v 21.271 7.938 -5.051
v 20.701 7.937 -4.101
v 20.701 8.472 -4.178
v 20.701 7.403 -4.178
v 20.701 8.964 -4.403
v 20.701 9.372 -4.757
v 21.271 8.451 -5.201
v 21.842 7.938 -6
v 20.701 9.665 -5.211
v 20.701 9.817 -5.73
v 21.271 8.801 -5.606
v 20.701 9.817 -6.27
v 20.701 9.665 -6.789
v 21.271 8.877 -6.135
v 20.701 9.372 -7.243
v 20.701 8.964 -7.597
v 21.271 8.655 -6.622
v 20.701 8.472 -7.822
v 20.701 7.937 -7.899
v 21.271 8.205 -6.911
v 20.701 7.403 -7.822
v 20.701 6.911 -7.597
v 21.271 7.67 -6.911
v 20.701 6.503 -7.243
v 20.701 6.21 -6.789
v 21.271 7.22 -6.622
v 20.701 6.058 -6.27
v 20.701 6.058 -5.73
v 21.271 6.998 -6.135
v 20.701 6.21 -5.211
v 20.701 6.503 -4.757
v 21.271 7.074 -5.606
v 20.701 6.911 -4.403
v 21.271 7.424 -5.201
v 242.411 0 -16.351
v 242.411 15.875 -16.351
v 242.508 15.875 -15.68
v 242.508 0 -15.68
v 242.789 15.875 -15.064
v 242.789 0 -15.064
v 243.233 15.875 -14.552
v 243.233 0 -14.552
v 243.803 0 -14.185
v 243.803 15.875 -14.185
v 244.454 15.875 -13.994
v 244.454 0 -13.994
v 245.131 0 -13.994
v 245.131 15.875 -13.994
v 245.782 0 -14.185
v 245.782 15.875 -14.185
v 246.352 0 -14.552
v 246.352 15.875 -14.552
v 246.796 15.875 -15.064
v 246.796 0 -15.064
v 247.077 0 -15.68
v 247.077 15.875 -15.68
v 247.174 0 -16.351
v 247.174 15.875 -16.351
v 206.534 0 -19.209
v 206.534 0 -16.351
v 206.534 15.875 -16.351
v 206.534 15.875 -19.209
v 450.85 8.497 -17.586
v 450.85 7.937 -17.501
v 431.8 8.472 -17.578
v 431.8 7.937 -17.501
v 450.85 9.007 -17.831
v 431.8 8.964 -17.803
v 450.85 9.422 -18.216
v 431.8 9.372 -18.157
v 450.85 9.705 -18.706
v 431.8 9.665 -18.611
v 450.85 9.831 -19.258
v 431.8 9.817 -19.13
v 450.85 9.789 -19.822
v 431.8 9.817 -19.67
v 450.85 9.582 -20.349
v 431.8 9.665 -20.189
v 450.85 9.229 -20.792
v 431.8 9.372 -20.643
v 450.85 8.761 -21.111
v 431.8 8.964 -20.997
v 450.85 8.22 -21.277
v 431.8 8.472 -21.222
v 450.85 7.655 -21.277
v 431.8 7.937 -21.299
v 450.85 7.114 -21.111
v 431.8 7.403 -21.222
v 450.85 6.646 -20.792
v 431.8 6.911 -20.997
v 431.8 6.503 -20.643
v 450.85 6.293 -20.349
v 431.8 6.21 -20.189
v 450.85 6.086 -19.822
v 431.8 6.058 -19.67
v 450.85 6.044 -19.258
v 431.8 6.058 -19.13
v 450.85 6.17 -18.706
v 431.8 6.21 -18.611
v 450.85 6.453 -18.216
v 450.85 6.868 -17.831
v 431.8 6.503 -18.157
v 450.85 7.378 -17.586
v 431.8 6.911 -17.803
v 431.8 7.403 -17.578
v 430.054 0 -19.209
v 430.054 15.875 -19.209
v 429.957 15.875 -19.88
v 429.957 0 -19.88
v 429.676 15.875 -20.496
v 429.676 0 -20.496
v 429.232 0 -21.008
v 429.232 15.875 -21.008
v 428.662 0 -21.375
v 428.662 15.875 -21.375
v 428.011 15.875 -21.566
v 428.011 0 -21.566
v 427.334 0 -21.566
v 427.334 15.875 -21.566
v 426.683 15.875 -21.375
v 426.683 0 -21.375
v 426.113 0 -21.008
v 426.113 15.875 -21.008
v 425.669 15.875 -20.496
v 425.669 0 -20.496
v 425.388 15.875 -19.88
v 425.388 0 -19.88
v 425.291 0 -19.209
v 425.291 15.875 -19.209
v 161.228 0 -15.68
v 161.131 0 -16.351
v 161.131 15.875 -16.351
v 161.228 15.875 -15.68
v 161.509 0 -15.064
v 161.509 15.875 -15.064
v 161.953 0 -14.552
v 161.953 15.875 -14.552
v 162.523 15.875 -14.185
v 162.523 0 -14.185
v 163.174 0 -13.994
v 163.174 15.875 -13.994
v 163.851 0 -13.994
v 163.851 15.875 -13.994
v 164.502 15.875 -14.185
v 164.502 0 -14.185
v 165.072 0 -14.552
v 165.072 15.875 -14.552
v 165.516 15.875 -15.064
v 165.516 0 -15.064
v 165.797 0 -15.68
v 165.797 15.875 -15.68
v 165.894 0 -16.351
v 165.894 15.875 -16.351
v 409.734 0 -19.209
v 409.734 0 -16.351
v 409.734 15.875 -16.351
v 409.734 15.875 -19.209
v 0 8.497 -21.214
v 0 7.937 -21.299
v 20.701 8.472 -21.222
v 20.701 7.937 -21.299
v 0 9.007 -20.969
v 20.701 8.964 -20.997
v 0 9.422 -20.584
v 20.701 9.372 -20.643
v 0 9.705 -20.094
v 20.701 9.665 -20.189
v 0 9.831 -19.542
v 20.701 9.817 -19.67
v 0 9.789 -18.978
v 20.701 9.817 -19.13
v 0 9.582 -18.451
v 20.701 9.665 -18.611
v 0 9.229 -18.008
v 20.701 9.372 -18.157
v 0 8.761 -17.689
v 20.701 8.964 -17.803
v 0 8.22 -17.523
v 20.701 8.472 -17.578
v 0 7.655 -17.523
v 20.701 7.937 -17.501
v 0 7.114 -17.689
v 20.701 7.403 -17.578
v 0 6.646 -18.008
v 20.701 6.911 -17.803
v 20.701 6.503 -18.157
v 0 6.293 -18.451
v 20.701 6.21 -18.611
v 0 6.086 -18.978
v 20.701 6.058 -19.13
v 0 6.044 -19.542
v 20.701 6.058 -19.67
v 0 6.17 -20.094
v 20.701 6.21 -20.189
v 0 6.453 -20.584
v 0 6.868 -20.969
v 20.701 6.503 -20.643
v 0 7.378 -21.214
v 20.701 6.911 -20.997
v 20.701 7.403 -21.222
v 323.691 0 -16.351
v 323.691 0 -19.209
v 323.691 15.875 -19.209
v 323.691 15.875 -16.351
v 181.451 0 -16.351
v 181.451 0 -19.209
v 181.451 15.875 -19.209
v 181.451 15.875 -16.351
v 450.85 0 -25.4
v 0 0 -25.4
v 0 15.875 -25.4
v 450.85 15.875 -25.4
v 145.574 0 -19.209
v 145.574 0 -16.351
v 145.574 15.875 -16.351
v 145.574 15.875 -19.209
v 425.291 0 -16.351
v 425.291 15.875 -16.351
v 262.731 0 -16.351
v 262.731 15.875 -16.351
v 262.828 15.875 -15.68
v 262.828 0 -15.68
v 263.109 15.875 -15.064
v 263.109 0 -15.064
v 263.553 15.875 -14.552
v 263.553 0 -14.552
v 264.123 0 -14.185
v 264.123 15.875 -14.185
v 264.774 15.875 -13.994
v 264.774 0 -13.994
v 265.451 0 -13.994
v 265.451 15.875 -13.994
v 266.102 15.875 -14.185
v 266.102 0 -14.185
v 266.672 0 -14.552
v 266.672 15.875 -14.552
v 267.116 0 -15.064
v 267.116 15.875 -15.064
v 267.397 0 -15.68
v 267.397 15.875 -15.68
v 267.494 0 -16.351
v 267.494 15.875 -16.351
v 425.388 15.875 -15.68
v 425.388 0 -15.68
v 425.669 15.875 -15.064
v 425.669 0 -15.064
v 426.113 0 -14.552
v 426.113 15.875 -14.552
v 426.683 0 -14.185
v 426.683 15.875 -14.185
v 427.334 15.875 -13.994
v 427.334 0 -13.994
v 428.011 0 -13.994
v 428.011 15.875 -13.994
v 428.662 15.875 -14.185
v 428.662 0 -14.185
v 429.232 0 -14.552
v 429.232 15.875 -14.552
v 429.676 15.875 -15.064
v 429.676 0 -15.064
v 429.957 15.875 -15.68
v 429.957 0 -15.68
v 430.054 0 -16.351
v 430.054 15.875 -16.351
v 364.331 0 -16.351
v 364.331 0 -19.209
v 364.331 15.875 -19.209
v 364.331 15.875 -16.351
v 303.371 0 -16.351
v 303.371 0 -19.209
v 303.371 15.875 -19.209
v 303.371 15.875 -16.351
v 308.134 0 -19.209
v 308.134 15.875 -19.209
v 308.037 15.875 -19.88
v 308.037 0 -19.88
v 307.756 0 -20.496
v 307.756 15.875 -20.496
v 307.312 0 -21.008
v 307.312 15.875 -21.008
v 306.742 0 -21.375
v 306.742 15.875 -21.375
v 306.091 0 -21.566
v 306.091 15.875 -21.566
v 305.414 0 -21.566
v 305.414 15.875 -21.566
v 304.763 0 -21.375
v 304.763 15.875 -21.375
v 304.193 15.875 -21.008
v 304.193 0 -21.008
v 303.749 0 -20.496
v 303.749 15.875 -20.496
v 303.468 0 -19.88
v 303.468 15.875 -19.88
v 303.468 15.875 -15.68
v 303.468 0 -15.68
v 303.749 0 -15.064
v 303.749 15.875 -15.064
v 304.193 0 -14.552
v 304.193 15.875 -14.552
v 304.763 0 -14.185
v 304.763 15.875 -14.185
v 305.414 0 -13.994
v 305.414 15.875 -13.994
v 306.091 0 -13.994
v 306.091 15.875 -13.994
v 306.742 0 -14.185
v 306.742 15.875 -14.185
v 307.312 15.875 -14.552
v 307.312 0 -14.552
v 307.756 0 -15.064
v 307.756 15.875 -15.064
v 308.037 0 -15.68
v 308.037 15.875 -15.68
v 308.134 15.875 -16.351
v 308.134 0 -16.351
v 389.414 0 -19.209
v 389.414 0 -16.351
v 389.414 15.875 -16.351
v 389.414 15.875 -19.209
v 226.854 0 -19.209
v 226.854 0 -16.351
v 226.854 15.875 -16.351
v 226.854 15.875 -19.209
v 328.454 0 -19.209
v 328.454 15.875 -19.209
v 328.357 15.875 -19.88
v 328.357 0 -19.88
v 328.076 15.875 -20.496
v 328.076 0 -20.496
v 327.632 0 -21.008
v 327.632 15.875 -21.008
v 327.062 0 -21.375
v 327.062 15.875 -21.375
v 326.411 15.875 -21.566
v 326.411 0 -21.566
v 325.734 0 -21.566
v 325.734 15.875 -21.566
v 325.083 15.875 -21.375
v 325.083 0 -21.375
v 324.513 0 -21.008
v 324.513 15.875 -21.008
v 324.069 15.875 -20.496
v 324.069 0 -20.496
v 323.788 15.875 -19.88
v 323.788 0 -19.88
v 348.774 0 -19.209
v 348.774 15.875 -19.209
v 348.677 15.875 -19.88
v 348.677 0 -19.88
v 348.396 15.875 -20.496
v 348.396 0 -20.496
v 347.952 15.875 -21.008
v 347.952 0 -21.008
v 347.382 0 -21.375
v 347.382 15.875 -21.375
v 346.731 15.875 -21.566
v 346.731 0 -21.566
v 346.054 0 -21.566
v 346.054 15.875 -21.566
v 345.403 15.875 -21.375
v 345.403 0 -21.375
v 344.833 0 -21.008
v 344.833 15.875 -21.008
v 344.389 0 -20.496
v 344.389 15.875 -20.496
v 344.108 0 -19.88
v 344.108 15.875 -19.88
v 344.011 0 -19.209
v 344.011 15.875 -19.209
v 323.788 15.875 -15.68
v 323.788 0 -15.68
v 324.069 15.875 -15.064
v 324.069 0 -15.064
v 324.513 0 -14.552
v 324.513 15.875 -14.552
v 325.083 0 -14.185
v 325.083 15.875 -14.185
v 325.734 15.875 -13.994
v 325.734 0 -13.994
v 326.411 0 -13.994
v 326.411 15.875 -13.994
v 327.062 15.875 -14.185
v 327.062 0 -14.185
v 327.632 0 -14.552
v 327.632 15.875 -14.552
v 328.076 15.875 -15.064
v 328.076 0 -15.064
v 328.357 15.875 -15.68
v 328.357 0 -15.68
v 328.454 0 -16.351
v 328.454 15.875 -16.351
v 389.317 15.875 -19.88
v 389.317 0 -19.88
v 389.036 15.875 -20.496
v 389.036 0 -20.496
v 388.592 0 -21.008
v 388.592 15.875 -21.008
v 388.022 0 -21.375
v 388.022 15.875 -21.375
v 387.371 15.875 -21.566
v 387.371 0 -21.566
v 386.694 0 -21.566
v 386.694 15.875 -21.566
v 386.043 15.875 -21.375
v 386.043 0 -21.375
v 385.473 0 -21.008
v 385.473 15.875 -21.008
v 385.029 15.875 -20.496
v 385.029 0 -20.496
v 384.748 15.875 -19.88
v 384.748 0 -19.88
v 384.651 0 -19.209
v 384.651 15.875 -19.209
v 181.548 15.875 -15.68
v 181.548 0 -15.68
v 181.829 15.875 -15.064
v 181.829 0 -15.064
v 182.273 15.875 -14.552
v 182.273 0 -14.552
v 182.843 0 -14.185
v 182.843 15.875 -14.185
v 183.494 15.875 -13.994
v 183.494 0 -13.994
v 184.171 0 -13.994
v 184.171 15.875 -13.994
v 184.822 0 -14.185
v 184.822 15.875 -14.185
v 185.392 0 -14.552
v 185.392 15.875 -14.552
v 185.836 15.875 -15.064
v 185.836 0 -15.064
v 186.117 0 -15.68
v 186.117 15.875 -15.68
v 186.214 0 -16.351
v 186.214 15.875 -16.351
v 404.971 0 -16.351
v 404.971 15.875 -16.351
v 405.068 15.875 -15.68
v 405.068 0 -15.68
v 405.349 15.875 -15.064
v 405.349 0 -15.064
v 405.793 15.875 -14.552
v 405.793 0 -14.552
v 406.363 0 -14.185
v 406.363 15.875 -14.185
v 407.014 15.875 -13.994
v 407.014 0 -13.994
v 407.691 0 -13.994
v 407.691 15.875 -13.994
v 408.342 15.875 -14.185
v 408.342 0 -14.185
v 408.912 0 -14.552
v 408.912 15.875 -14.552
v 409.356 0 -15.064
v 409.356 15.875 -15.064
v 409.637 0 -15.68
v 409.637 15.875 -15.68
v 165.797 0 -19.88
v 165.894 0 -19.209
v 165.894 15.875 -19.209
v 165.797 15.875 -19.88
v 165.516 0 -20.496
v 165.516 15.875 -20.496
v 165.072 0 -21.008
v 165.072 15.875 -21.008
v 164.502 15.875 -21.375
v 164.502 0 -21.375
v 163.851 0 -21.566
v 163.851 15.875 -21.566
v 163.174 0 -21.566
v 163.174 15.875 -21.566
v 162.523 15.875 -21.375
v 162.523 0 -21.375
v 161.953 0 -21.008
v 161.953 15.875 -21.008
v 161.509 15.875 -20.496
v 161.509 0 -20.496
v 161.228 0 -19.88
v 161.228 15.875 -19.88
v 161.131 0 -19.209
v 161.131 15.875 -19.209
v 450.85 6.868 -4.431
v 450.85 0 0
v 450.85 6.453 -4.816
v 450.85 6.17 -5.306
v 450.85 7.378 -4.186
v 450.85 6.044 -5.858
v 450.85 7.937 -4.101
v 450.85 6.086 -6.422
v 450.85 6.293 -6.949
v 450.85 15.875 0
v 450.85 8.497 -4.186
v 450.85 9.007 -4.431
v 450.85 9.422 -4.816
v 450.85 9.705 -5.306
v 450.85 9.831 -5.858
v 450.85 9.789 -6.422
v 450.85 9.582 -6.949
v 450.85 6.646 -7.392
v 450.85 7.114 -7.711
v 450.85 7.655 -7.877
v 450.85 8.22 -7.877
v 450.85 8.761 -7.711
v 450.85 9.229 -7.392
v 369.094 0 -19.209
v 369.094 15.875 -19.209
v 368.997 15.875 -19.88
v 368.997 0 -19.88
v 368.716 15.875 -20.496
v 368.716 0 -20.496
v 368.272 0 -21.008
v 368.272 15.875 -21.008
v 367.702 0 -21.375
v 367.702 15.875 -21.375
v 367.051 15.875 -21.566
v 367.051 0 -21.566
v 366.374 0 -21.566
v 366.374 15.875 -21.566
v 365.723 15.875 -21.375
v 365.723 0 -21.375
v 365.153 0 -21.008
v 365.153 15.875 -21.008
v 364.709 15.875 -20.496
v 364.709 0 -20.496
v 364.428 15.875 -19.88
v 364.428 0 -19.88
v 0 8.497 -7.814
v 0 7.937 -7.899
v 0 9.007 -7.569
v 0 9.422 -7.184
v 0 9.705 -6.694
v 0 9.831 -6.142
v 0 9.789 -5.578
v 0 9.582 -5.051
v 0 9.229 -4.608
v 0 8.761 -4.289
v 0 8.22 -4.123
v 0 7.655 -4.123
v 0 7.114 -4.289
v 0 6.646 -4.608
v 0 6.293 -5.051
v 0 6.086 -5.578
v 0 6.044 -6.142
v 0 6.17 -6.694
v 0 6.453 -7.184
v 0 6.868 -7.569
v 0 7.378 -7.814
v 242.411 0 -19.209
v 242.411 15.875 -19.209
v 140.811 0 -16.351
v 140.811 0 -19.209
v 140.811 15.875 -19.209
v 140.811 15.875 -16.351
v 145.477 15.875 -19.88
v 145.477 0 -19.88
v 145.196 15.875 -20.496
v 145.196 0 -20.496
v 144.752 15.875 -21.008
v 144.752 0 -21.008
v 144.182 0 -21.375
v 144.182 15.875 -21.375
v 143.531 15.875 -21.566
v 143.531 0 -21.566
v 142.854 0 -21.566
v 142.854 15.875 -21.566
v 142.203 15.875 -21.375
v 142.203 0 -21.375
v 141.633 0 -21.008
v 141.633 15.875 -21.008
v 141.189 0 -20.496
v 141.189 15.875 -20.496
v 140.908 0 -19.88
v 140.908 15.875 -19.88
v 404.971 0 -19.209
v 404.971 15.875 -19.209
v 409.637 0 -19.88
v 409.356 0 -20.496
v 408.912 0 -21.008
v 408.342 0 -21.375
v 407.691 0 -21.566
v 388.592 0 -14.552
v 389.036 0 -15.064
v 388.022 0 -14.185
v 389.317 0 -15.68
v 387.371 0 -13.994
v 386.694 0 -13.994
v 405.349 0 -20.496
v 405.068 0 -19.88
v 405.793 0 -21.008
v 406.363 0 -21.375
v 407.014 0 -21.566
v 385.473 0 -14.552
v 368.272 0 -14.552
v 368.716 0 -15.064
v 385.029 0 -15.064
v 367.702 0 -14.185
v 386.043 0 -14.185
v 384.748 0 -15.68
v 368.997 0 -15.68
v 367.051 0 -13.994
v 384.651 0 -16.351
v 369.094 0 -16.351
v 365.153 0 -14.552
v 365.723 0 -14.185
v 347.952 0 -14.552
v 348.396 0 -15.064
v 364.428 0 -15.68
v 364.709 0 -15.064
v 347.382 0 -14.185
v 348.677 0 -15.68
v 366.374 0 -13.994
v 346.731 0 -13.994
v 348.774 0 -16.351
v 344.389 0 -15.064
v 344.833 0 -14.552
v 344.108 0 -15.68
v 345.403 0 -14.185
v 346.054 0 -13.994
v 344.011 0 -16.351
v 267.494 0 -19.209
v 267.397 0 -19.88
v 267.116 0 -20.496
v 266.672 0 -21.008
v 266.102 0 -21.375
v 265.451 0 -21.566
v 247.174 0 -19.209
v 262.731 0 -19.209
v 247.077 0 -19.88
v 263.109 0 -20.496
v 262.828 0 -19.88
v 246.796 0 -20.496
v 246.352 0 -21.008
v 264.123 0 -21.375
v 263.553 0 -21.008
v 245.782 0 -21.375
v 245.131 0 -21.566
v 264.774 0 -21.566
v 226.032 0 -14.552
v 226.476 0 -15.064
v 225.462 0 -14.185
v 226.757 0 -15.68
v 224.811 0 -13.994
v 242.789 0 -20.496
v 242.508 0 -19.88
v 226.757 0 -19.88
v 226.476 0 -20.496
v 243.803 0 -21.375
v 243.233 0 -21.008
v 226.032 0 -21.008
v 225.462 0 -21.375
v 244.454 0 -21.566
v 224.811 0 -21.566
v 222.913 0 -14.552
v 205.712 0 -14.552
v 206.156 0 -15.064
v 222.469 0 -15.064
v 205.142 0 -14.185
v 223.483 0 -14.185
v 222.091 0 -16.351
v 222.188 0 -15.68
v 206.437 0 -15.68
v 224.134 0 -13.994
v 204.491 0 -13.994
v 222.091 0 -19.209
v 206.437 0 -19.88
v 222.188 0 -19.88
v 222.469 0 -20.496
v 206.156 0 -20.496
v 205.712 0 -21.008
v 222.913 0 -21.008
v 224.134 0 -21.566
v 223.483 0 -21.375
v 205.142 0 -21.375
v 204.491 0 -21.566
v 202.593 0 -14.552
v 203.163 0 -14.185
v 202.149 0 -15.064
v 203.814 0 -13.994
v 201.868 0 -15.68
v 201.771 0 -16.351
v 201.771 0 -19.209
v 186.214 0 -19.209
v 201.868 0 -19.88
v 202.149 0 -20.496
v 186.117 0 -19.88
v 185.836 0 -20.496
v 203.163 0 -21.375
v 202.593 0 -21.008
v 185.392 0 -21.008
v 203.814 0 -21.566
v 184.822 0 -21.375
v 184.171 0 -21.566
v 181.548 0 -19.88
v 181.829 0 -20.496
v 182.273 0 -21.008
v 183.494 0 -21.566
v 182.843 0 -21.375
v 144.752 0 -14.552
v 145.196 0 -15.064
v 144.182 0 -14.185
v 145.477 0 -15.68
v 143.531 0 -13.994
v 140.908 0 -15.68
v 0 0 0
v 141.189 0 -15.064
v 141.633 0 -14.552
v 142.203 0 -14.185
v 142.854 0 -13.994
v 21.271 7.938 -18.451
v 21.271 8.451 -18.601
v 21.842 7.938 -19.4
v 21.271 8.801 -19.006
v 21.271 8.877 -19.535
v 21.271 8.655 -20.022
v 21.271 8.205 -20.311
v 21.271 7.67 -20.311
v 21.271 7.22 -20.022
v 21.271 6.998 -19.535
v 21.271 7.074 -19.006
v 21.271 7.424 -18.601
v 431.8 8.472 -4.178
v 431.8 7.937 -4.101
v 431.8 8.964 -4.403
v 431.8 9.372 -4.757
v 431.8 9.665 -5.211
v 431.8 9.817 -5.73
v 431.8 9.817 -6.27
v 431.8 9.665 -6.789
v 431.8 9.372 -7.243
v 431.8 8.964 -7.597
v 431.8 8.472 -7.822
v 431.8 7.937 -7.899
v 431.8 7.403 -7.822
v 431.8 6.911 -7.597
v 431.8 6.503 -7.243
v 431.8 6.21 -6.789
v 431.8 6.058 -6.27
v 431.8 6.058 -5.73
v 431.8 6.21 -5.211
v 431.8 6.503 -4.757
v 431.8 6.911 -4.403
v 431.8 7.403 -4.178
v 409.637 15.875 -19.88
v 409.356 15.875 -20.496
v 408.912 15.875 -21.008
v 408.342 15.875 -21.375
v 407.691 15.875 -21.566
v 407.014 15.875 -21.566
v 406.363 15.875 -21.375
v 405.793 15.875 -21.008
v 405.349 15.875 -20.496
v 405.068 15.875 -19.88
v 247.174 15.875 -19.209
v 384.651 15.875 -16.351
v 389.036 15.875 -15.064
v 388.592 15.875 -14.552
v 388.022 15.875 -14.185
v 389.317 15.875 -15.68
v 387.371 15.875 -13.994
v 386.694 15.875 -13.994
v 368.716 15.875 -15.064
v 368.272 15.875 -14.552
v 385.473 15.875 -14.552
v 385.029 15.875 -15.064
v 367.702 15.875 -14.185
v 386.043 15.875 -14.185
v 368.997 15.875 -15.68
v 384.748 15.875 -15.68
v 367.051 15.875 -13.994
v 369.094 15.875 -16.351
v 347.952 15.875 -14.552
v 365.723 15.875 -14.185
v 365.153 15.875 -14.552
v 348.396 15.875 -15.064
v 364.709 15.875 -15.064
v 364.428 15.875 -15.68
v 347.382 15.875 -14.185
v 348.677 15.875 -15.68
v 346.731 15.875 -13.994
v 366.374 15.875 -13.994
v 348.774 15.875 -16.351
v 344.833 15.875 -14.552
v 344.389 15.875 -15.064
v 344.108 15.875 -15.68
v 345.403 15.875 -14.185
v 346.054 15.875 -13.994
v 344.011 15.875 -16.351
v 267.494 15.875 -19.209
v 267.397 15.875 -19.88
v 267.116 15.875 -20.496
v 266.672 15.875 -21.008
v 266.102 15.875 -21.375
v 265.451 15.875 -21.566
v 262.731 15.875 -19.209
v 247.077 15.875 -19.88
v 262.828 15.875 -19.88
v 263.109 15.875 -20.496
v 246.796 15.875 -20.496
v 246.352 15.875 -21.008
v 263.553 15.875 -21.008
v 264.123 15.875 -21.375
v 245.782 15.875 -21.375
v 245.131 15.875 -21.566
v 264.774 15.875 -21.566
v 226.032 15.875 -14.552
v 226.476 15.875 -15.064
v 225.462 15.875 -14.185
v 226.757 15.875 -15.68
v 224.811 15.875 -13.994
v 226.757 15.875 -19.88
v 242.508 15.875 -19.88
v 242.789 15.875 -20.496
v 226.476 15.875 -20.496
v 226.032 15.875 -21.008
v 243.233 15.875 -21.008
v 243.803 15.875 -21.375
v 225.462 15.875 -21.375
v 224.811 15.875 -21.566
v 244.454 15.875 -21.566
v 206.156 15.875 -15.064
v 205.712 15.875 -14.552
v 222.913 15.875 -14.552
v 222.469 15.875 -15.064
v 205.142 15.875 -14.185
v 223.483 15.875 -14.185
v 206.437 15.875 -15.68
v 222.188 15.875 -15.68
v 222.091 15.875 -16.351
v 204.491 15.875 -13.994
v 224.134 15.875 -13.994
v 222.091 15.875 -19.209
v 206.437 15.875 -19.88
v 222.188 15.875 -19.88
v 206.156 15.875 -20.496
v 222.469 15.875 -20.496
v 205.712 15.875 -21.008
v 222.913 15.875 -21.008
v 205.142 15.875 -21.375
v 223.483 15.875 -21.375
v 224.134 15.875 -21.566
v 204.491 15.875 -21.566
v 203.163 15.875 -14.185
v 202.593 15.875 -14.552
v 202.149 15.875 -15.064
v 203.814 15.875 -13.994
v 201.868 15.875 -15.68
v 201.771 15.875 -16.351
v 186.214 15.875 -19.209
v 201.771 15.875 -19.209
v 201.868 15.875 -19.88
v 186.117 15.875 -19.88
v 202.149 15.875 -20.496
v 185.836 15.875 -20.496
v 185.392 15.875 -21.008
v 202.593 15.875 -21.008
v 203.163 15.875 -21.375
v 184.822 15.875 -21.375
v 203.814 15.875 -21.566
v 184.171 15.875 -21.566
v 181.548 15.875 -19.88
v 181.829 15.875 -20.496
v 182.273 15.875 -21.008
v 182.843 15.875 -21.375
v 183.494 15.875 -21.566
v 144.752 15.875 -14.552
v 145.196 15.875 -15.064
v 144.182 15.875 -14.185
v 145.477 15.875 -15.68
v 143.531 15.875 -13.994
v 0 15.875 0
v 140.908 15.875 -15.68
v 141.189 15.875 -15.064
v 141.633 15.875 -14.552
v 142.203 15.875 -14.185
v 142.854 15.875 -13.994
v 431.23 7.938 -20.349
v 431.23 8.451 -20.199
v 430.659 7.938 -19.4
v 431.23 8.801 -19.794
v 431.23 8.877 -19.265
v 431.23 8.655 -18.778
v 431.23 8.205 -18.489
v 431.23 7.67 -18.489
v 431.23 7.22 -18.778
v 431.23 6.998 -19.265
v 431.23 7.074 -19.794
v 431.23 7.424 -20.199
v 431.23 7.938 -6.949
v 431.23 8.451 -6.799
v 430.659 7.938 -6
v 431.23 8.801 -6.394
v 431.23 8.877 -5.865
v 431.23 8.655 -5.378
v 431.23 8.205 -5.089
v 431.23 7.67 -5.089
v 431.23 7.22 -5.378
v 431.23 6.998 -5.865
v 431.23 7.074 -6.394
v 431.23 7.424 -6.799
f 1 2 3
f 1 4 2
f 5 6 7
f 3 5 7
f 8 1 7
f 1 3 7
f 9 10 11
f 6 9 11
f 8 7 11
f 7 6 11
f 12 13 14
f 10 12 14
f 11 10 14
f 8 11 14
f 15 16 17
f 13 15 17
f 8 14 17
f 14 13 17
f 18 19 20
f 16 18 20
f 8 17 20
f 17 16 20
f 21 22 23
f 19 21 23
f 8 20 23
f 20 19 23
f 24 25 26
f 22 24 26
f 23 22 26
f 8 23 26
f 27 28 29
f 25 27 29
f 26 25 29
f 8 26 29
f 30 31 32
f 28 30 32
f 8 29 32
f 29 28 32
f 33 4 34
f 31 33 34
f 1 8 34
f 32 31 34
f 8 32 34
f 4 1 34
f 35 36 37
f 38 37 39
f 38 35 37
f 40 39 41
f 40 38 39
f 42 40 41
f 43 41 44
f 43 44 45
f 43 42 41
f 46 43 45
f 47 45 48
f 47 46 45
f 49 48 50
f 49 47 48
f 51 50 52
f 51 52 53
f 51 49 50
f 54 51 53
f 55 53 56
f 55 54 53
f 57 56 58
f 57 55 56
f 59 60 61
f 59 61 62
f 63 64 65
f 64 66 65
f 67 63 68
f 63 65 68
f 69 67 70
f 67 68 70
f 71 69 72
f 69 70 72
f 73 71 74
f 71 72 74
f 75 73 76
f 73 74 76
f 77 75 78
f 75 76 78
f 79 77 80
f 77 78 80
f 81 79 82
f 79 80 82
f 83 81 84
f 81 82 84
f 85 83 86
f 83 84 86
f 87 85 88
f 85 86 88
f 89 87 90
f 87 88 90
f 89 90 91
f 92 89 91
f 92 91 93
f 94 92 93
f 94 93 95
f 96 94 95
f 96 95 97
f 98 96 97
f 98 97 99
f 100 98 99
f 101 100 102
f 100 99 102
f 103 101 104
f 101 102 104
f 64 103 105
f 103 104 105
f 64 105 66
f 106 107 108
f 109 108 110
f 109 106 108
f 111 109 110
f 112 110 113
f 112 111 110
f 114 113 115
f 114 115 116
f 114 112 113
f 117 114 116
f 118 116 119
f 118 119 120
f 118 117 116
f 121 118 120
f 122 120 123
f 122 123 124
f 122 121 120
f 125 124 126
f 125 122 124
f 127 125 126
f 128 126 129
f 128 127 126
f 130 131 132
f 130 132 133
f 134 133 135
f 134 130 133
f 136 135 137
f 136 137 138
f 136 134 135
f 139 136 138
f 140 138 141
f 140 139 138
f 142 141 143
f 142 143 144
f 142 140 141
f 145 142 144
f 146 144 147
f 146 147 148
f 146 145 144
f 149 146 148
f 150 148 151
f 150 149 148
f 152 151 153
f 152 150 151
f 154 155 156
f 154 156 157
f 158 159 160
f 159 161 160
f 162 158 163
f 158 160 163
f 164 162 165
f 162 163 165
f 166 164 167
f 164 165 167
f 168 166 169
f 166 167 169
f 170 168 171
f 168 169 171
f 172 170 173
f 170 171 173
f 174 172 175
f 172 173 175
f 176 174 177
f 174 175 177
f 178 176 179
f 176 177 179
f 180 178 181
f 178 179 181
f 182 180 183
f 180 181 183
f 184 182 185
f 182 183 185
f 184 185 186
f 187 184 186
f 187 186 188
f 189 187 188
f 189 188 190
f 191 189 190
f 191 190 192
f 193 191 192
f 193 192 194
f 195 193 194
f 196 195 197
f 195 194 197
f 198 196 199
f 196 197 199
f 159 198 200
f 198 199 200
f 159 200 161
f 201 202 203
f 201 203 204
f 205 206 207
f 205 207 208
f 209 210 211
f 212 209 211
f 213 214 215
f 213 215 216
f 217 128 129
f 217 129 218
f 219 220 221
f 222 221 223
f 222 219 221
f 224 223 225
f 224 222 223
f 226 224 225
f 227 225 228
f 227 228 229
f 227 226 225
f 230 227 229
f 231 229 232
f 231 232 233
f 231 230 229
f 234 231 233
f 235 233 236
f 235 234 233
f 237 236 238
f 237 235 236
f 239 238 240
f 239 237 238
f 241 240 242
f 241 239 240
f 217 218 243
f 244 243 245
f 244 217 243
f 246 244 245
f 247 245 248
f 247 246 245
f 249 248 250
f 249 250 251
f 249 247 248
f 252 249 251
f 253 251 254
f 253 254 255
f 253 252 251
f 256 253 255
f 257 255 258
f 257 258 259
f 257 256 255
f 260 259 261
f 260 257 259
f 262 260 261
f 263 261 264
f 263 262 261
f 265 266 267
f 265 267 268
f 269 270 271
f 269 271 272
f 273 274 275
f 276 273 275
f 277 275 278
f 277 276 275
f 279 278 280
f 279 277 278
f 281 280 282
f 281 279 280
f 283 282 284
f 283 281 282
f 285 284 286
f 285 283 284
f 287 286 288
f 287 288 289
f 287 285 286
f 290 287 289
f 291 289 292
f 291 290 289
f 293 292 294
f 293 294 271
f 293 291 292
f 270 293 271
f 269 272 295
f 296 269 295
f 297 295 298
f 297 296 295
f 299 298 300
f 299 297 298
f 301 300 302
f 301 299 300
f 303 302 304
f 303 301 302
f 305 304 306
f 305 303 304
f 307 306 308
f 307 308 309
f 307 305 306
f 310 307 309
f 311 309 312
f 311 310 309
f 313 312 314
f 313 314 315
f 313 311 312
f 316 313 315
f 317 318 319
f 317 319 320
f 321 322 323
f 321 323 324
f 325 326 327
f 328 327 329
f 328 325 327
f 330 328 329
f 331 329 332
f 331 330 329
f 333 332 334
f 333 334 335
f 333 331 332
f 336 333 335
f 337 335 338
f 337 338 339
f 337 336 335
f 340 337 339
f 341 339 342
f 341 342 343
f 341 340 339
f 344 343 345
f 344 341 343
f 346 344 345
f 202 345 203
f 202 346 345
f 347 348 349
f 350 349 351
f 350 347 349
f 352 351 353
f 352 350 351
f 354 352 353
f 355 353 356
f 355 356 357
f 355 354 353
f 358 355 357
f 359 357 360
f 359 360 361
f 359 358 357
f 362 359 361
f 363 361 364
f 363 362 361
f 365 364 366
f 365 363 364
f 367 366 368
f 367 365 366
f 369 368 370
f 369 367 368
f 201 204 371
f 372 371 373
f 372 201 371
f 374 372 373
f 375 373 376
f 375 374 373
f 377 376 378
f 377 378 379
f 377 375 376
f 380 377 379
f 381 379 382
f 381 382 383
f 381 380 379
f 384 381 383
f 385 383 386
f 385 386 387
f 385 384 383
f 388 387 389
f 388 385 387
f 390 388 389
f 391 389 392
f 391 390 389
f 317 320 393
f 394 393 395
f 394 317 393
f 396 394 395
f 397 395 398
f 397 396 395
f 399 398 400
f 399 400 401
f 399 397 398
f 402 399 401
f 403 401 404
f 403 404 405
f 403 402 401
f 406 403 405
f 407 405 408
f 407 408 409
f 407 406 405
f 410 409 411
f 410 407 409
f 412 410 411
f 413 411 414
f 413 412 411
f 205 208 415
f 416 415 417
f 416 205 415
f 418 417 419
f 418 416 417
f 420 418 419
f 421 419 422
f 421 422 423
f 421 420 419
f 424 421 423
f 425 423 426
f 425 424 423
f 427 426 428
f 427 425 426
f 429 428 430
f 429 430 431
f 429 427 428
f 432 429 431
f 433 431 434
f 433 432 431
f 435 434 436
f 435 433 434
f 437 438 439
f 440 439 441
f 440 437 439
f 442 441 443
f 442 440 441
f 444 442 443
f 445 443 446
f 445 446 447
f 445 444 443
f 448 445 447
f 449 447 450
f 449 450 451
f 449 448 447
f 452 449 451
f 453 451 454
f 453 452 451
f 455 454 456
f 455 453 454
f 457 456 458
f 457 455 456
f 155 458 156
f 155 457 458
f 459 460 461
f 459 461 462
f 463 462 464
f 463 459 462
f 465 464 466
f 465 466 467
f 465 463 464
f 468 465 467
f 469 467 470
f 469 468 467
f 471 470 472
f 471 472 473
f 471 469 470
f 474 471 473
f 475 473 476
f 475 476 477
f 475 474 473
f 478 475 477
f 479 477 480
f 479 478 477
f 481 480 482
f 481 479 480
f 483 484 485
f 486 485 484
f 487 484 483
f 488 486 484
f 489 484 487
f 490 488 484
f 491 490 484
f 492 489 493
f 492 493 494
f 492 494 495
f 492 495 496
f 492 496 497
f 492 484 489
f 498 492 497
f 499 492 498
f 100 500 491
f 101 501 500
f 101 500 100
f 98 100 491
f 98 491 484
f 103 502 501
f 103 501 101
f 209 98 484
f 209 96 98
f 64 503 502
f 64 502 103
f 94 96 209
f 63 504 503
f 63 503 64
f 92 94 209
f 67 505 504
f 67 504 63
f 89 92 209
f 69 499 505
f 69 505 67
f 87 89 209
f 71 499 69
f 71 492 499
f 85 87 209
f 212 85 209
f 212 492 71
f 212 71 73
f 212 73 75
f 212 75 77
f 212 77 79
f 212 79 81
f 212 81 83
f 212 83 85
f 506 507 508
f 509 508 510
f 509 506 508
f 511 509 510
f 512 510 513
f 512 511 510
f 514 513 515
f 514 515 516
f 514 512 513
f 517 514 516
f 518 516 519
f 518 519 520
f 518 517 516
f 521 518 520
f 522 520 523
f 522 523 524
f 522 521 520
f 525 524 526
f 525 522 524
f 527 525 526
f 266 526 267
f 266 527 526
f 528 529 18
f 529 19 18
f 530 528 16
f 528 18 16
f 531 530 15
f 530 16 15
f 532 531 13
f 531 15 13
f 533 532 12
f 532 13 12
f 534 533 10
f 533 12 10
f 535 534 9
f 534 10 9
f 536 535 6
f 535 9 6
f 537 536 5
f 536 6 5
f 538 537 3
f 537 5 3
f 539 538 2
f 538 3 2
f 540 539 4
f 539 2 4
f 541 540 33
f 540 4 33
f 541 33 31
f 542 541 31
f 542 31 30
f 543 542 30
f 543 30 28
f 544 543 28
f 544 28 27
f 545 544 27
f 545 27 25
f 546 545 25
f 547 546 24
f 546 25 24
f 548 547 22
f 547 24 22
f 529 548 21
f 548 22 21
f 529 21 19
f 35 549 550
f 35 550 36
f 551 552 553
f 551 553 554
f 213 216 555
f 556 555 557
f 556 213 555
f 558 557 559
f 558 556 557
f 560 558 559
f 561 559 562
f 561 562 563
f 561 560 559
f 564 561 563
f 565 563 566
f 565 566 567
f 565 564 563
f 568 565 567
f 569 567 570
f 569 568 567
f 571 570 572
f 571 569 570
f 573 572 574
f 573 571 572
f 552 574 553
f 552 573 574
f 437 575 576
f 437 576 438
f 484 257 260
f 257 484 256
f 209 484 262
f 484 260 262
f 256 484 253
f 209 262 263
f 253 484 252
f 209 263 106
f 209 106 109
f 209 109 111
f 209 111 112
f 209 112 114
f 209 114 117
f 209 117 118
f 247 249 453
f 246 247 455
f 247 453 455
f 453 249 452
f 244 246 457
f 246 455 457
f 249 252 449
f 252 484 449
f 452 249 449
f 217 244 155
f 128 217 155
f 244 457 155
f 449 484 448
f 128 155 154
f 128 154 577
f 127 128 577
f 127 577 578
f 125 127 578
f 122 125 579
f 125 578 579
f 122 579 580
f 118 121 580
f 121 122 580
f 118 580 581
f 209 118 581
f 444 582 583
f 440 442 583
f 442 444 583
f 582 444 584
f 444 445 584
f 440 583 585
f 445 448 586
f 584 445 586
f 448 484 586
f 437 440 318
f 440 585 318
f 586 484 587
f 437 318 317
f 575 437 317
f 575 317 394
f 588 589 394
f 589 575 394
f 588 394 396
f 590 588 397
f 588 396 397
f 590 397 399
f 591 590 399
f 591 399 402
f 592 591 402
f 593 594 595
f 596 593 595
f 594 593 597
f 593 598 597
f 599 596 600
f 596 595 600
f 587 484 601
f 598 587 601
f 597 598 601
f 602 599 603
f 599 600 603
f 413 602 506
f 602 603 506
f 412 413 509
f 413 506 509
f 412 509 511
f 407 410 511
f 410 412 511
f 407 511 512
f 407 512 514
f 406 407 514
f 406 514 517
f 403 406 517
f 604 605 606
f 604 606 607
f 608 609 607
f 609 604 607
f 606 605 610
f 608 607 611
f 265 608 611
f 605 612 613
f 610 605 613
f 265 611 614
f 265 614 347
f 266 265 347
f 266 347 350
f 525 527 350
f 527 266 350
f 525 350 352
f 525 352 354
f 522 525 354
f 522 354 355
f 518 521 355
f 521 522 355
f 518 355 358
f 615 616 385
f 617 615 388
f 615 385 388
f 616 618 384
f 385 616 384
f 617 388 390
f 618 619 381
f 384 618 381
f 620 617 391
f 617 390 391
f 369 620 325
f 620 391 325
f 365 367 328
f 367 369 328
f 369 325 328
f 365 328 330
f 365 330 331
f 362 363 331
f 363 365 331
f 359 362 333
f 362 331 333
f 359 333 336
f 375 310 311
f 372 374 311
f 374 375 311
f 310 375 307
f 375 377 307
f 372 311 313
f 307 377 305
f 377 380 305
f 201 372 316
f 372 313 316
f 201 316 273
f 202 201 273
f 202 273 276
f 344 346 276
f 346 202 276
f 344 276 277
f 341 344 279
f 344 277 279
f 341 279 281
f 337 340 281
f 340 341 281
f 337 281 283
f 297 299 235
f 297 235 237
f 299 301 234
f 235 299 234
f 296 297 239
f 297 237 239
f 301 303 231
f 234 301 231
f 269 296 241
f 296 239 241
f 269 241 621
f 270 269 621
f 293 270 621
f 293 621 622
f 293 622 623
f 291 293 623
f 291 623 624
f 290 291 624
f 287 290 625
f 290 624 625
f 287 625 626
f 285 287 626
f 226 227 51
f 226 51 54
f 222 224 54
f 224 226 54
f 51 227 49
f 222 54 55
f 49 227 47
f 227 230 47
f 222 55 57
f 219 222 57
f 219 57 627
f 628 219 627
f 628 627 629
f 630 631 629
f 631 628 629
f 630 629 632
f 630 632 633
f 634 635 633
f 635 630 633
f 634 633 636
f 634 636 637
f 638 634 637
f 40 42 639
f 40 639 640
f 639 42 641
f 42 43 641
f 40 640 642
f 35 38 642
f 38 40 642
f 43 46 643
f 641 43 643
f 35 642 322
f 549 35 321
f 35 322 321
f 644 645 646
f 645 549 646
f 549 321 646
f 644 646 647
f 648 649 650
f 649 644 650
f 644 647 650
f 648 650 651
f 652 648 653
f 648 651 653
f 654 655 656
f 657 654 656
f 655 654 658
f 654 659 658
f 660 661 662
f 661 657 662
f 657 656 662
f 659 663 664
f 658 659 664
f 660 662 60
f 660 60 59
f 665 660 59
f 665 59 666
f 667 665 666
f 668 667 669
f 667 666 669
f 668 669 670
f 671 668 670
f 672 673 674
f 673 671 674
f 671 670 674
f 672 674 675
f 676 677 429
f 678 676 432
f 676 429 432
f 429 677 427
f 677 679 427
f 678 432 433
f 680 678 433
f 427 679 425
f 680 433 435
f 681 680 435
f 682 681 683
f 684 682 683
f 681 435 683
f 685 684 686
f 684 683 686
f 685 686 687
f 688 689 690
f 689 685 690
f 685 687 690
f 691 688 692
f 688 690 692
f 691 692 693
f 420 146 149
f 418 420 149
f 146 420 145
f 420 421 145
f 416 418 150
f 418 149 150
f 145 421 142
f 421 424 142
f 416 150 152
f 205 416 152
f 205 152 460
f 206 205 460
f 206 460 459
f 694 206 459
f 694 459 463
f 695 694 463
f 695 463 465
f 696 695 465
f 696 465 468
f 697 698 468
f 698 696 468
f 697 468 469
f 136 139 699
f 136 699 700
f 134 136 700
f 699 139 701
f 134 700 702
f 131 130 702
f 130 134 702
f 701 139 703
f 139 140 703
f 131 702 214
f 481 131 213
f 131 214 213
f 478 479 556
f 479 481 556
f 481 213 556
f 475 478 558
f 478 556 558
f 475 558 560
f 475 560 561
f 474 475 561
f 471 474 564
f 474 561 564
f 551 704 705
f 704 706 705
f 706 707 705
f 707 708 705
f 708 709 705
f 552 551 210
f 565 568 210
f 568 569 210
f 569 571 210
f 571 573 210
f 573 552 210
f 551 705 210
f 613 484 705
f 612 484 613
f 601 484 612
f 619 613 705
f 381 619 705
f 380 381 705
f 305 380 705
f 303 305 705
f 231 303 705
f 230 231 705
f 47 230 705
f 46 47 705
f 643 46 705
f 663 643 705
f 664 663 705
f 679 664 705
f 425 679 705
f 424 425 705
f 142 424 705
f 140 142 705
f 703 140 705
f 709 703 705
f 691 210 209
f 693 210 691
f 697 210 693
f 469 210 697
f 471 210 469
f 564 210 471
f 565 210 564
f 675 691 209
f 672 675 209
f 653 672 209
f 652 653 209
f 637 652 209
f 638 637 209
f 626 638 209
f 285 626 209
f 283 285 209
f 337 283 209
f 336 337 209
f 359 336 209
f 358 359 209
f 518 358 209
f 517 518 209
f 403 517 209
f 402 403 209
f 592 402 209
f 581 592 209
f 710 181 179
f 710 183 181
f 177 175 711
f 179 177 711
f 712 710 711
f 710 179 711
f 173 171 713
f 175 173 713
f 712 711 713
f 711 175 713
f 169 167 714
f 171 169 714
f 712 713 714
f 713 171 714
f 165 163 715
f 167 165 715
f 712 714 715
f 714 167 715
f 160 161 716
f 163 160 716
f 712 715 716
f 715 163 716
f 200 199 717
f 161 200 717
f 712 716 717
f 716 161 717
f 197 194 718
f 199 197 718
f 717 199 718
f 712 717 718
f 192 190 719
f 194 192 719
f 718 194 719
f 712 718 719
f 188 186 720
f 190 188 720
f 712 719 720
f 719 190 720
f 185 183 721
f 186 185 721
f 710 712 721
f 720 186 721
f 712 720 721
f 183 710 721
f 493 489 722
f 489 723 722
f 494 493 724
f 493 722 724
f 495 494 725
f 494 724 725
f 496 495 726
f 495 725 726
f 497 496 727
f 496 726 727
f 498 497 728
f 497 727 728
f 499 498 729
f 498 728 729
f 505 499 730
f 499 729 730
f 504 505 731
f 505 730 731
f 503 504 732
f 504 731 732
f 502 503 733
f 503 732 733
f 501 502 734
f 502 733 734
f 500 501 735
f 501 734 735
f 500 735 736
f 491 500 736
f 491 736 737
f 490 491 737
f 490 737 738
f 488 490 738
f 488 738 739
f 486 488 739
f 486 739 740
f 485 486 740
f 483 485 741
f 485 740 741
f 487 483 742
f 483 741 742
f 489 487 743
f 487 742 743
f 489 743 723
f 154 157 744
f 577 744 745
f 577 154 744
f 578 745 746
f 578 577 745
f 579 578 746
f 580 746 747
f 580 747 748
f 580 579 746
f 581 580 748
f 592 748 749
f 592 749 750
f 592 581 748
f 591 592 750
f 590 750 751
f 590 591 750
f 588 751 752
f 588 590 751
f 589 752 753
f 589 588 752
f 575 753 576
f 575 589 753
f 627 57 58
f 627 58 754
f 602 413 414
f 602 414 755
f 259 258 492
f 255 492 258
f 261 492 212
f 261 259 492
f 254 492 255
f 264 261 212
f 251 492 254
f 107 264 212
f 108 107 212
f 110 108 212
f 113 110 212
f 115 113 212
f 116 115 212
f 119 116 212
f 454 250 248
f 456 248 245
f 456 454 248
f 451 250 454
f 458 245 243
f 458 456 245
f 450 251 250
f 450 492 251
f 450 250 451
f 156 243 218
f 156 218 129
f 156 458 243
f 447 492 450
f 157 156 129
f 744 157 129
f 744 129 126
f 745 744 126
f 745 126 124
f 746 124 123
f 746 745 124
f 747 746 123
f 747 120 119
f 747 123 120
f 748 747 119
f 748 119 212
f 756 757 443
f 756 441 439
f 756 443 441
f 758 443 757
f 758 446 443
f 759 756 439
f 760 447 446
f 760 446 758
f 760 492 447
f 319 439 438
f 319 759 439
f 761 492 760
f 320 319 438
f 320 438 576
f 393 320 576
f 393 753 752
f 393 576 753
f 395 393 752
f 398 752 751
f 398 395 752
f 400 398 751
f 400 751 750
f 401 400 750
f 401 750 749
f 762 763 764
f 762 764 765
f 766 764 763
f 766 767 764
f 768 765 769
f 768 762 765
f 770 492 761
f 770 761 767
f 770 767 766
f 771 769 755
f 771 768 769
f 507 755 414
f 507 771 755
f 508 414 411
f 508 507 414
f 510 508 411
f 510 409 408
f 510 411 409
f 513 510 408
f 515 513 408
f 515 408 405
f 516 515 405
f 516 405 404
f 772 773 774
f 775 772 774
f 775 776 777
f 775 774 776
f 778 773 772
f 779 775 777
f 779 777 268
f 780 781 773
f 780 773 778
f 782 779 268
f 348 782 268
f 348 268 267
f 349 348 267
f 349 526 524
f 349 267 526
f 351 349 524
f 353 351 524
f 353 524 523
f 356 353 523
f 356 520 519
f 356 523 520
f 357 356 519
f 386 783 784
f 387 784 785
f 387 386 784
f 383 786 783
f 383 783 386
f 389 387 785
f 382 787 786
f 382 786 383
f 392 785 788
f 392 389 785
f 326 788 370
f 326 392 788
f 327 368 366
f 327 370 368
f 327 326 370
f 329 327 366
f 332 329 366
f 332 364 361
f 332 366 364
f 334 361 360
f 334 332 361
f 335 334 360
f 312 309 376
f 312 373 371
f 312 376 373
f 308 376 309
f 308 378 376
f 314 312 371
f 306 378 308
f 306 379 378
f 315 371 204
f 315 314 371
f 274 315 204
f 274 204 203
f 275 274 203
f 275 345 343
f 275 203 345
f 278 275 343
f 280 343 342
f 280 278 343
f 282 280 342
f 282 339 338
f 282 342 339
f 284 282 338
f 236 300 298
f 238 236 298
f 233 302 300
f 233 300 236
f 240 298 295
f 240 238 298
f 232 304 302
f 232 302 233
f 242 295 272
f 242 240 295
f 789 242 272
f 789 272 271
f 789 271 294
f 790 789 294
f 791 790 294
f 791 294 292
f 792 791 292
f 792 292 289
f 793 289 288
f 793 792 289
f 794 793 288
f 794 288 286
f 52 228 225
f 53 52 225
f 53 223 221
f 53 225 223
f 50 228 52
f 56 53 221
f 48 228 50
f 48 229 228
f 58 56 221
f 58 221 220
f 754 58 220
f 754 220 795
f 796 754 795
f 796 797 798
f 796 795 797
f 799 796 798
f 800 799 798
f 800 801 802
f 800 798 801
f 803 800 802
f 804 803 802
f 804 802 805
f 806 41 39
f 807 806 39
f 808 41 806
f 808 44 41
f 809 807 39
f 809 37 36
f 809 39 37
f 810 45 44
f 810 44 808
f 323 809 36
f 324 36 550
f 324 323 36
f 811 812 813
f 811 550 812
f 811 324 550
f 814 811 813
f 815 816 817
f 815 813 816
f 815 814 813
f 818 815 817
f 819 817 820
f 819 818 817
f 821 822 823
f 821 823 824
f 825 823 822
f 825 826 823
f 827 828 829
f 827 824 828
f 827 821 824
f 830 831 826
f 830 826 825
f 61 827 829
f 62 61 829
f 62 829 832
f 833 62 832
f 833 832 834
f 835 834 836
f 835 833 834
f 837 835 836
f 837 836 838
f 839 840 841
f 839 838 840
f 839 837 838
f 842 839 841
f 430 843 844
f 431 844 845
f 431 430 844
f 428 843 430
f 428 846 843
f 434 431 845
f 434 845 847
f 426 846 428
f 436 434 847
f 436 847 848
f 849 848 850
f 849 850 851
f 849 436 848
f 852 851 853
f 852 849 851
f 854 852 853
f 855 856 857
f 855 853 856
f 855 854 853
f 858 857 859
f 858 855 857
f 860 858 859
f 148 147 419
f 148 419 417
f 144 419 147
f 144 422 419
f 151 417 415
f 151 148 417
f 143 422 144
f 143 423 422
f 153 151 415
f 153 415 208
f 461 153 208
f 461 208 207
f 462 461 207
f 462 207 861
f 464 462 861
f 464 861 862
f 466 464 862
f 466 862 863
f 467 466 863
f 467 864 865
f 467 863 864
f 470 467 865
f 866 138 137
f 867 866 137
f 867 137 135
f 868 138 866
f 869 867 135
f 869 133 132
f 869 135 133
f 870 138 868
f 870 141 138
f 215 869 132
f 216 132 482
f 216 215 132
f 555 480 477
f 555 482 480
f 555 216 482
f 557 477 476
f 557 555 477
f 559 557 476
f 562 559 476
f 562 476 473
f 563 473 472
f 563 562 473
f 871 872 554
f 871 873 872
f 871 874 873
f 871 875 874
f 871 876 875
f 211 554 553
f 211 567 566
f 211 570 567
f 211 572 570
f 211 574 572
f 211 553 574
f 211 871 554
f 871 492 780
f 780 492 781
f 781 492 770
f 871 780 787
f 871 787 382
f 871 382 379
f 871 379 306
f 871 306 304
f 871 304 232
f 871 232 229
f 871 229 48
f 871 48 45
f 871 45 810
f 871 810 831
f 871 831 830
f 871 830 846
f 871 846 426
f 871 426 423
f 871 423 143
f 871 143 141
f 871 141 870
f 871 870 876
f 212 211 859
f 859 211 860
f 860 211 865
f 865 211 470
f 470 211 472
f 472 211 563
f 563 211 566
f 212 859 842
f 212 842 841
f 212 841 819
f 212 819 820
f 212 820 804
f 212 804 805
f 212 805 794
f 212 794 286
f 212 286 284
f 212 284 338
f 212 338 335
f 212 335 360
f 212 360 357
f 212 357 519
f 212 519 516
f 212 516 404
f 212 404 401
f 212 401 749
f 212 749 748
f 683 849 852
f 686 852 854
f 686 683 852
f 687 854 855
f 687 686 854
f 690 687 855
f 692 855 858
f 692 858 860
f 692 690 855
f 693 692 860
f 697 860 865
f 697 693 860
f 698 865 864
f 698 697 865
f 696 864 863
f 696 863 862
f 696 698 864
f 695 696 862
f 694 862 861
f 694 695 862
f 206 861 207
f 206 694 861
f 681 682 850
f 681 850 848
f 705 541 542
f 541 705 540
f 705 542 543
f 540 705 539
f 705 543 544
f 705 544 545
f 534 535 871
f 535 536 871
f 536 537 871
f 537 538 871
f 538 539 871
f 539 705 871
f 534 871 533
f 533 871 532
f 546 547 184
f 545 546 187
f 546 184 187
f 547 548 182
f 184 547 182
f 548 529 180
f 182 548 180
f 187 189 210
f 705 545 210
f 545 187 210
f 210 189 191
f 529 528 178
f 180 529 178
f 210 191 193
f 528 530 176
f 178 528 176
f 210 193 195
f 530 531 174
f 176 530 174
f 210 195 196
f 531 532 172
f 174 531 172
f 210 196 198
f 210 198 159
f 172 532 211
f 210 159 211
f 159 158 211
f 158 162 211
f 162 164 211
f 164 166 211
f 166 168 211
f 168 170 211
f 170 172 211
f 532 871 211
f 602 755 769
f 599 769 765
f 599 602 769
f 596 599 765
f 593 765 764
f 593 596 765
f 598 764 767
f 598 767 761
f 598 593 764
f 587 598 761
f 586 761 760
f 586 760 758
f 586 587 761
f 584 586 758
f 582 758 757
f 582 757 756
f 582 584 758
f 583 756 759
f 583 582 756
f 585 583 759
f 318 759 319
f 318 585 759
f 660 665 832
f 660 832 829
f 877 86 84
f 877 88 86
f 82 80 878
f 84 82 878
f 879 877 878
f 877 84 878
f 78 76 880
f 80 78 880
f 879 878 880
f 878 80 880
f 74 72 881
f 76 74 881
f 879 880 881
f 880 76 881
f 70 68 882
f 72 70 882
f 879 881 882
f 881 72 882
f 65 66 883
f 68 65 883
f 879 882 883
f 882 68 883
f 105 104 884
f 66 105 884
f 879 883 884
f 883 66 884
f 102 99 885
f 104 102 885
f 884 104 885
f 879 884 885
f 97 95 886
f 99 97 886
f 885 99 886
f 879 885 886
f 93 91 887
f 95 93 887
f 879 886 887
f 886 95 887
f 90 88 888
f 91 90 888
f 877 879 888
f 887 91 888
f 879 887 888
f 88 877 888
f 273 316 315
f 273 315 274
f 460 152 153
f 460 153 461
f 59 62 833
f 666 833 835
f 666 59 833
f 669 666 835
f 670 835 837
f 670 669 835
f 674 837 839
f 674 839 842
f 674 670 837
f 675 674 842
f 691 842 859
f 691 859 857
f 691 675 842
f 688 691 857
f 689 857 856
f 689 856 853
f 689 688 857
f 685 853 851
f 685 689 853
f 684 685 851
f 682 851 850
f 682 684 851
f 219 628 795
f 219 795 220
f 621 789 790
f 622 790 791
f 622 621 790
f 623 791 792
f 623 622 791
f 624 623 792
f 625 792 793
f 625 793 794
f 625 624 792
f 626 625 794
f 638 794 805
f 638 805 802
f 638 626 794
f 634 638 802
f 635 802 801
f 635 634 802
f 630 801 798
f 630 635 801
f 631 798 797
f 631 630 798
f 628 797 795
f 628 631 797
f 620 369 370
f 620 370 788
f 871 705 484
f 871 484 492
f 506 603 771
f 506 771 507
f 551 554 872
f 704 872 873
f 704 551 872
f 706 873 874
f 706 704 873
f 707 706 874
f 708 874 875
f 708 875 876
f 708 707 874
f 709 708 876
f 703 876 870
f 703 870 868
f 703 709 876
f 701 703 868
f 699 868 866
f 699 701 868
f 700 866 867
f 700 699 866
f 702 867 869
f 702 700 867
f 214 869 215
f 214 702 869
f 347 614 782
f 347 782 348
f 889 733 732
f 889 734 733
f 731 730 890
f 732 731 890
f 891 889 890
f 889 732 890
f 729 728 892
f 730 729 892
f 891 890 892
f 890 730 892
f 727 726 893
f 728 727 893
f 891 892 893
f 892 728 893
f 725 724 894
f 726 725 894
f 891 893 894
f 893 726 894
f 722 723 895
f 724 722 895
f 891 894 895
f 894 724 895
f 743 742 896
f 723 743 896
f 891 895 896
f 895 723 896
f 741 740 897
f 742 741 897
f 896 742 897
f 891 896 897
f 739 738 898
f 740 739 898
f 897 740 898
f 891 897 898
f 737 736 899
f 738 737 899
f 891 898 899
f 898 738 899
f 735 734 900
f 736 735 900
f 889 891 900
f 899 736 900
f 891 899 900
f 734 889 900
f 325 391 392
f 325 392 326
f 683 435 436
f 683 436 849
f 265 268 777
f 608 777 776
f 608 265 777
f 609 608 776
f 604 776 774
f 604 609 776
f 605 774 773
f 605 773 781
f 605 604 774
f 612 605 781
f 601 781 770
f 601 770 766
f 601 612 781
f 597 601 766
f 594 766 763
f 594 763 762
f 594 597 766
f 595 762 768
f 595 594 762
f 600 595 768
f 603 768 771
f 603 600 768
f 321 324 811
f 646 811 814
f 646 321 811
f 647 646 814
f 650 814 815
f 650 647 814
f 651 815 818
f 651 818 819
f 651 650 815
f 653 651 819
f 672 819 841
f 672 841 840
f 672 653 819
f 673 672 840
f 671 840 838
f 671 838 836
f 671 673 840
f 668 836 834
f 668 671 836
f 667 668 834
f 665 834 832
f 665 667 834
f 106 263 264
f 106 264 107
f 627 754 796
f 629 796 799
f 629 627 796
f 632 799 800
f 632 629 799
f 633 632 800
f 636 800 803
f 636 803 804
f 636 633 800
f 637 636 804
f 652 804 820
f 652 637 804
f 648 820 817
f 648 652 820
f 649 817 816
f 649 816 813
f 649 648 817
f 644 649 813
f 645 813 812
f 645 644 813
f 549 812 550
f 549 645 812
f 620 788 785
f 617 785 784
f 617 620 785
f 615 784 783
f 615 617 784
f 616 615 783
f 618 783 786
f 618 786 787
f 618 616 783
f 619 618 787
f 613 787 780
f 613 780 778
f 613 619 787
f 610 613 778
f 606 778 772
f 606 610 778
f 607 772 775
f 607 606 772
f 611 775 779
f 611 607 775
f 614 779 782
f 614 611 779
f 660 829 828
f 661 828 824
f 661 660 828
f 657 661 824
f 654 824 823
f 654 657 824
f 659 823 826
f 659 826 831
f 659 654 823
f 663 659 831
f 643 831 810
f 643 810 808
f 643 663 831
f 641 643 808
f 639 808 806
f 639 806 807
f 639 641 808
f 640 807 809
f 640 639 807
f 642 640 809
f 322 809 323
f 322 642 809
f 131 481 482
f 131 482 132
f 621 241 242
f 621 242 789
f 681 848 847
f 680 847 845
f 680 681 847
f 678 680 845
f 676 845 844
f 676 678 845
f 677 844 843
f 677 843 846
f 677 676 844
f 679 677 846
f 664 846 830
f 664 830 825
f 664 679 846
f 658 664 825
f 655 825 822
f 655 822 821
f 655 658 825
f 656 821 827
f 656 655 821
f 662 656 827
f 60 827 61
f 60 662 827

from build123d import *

# Parameters (mm, degrees)
SKETCH1_W                      = 25.4
SKETCH1_H                      = 15.875
BOSS_EXTRUDE1_DEPTH            = 450.85
TAP_DRILL_FOR_10_24_TAP1_D     = 3.7973
TAP_DRILL_FOR_10_24_TAP1_DEPTH = 20.701
TAP_DRILL_FOR_10_24_TAP1_TIP   = 1.140824014
TAP_DRILL_FOR_10_24_TAP2_D     = 3.7973
TAP_DRILL_FOR_10_24_TAP2_DEPTH = 19.05
TAP_DRILL_FOR_10_24_TAP2_TIP   = 1.140824014
F_10_CLEARANCE_SLOT2_DEPTH     = 15.875


# Read off the part's stored shape, not the designer's step: #10 Clearance Slot2
with BuildPart() as part:
    # Sketch1 → Boss-Extrude1 (new body)
    with BuildSketch(Plane(origin=(0, 0, 0), x_dir=(0, 0, -1), z_dir=(1, 0, 0))):
        with Locations((12.7, 7.9375)):
            Rectangle(SKETCH1_W, SKETCH1_H)
    extrude(amount=BOSS_EXTRUDE1_DEPTH)

    # Tap Drill for #10-24 Tap1
    with Locations(Plane.ZY):
        with Locations((-6, 7.9375), (-19.4, 7.9375)):
            Hole(TAP_DRILL_FOR_10_24_TAP1_D / 2, depth=TAP_DRILL_FOR_10_24_TAP1_DEPTH)
            with Locations((0, 0, -(TAP_DRILL_FOR_10_24_TAP1_DEPTH + TAP_DRILL_FOR_10_24_TAP1_TIP / 2))):  # 118° drill point
                Cone(0, TAP_DRILL_FOR_10_24_TAP1_D / 2, TAP_DRILL_FOR_10_24_TAP1_TIP, mode=Mode.SUBTRACT)

    # Tap Drill for #10-24 Tap2
    with Locations(Plane(origin=(450.85, 0, 0), x_dir=(0, 0, -1), z_dir=(1, 0, 0))):
        with Locations((6, 7.9375), (19.4, 7.9375)):
            Hole(TAP_DRILL_FOR_10_24_TAP2_D / 2, depth=TAP_DRILL_FOR_10_24_TAP2_DEPTH)
            with Locations((0, 0, -(TAP_DRILL_FOR_10_24_TAP2_DEPTH + TAP_DRILL_FOR_10_24_TAP2_TIP / 2))):  # 118° drill point
                Cone(0, TAP_DRILL_FOR_10_24_TAP2_D / 2, TAP_DRILL_FOR_10_24_TAP2_TIP, mode=Mode.SUBTRACT)

    # #10 Clearance Slot2 outline → #10 Clearance Slot2 (cut)
    with BuildSketch(Plane(origin=(0, 0, 0), x_dir=(1, 0, 0), z_dir=(0, 1, 0))):
        with BuildLine():
            Line((145.57375, 16.35125), (145.57375, 19.20875))
            ThreePointArc((145.57375, 19.20875), (143.1925, 21.59), (140.81125, 19.20875))
            Line((140.81125, 19.20875), (140.81125, 16.35125))
            ThreePointArc((140.81125, 16.35125), (143.1925, 13.97), (145.57375, 16.35125))
        make_face()
        with BuildLine():
            Line((165.89375, 16.35125), (165.89375, 19.20875))
            ThreePointArc((165.89375, 19.20875), (163.5125, 21.59), (161.13125, 19.20875))
            Line((161.13125, 19.20875), (161.13125, 16.35125))
            ThreePointArc((161.13125, 16.35125), (163.5125, 13.97), (165.89375, 16.35125))
        make_face()
        with BuildLine():
            Line((186.21375, 16.35125), (186.21375, 19.20875))
            ThreePointArc((186.21375, 19.20875), (183.8325, 21.59), (181.45125, 19.20875))
            Line((181.45125, 19.20875), (181.45125, 16.35125))
            ThreePointArc((181.45125, 16.35125), (183.8325, 13.97), (186.21375, 16.35125))
        make_face()
        with BuildLine():
            Line((206.53375, 16.35125), (206.53375, 19.20875))
            ThreePointArc((206.53375, 19.20875), (204.1525, 21.59), (201.77125, 19.20875))
            Line((201.77125, 19.20875), (201.77125, 16.35125))
            ThreePointArc((201.77125, 16.35125), (204.1525, 13.97), (206.53375, 16.35125))
        make_face()
        with BuildLine():
            Line((226.85375, 16.35125), (226.85375, 19.20875))
            ThreePointArc((226.85375, 19.20875), (224.4725, 21.59), (222.09125, 19.20875))
            Line((222.09125, 19.20875), (222.09125, 16.35125))
            ThreePointArc((222.09125, 16.35125), (224.4725, 13.97), (226.85375, 16.35125))
        make_face()
        with BuildLine():
            Line((247.17375, 16.35125), (247.17375, 19.20875))
            ThreePointArc((247.17375, 19.20875), (244.7925, 21.59), (242.41125, 19.20875))
            Line((242.41125, 19.20875), (242.41125, 16.35125))
            ThreePointArc((242.41125, 16.35125), (244.7925, 13.97), (247.17375, 16.35125))
        make_face()
        with BuildLine():
            Line((267.49375, 16.35125), (267.49375, 19.20875))
            ThreePointArc((267.49375, 19.20875), (265.1125, 21.59), (262.73125, 19.20875))
            Line((262.73125, 19.20875), (262.73125, 16.35125))
            ThreePointArc((262.73125, 16.35125), (265.1125, 13.97), (267.49375, 16.35125))
        make_face()
        with BuildLine():
            Line((308.13375, 16.35125), (308.13375, 19.20875))
            ThreePointArc((308.13375, 19.20875), (305.7525, 21.59), (303.37125, 19.20875))
            Line((303.37125, 19.20875), (303.37125, 16.35125))
            ThreePointArc((303.37125, 16.35125), (305.7525, 13.97), (308.13375, 16.35125))
        make_face()
        with BuildLine():
            Line((328.45375, 16.35125), (328.45375, 19.20875))
            ThreePointArc((328.45375, 19.20875), (326.0725, 21.59), (323.69125, 19.20875))
            Line((323.69125, 19.20875), (323.69125, 16.35125))
            ThreePointArc((323.69125, 16.35125), (326.0725, 13.97), (328.45375, 16.35125))
        make_face()
        with BuildLine():
            Line((348.77375, 16.35125), (348.77375, 19.20875))
            ThreePointArc((348.77375, 19.20875), (346.3925, 21.59), (344.01125, 19.20875))
            Line((344.01125, 19.20875), (344.01125, 16.35125))
            ThreePointArc((344.01125, 16.35125), (346.3925, 13.97), (348.77375, 16.35125))
        make_face()
        with BuildLine():
            Line((369.09375, 16.35125), (369.09375, 19.20875))
            ThreePointArc((369.09375, 19.20875), (366.7125, 21.59), (364.33125, 19.20875))
            Line((364.33125, 19.20875), (364.33125, 16.35125))
            ThreePointArc((364.33125, 16.35125), (366.7125, 13.97), (369.09375, 16.35125))
        make_face()
        with BuildLine():
            Line((389.41375, 16.35125), (389.41375, 19.20875))
            ThreePointArc((389.41375, 19.20875), (387.0325, 21.59), (384.65125, 19.20875))
            Line((384.65125, 19.20875), (384.65125, 16.35125))
            ThreePointArc((384.65125, 16.35125), (387.0325, 13.97), (389.41375, 16.35125))
        make_face()
        with BuildLine():
            Line((409.73375, 16.35125), (409.73375, 19.20875))
            ThreePointArc((409.73375, 19.20875), (407.3525, 21.59), (404.97125, 19.20875))
            Line((404.97125, 19.20875), (404.97125, 16.35125))
            ThreePointArc((404.97125, 16.35125), (407.3525, 13.97), (409.73375, 16.35125))
        make_face()
        with BuildLine():
            Line((430.05375, 16.35125), (430.05375, 19.20875))
            ThreePointArc((430.05375, 19.20875), (427.6725, 21.59), (425.29125, 19.20875))
            Line((425.29125, 19.20875), (425.29125, 16.35125))
            ThreePointArc((425.29125, 16.35125), (427.6725, 13.97), (430.05375, 16.35125))
        make_face()
    extrude(amount=F_10_CLEARANCE_SLOT2_DEPTH, mode=Mode.SUBTRACT)


solid = part.part
